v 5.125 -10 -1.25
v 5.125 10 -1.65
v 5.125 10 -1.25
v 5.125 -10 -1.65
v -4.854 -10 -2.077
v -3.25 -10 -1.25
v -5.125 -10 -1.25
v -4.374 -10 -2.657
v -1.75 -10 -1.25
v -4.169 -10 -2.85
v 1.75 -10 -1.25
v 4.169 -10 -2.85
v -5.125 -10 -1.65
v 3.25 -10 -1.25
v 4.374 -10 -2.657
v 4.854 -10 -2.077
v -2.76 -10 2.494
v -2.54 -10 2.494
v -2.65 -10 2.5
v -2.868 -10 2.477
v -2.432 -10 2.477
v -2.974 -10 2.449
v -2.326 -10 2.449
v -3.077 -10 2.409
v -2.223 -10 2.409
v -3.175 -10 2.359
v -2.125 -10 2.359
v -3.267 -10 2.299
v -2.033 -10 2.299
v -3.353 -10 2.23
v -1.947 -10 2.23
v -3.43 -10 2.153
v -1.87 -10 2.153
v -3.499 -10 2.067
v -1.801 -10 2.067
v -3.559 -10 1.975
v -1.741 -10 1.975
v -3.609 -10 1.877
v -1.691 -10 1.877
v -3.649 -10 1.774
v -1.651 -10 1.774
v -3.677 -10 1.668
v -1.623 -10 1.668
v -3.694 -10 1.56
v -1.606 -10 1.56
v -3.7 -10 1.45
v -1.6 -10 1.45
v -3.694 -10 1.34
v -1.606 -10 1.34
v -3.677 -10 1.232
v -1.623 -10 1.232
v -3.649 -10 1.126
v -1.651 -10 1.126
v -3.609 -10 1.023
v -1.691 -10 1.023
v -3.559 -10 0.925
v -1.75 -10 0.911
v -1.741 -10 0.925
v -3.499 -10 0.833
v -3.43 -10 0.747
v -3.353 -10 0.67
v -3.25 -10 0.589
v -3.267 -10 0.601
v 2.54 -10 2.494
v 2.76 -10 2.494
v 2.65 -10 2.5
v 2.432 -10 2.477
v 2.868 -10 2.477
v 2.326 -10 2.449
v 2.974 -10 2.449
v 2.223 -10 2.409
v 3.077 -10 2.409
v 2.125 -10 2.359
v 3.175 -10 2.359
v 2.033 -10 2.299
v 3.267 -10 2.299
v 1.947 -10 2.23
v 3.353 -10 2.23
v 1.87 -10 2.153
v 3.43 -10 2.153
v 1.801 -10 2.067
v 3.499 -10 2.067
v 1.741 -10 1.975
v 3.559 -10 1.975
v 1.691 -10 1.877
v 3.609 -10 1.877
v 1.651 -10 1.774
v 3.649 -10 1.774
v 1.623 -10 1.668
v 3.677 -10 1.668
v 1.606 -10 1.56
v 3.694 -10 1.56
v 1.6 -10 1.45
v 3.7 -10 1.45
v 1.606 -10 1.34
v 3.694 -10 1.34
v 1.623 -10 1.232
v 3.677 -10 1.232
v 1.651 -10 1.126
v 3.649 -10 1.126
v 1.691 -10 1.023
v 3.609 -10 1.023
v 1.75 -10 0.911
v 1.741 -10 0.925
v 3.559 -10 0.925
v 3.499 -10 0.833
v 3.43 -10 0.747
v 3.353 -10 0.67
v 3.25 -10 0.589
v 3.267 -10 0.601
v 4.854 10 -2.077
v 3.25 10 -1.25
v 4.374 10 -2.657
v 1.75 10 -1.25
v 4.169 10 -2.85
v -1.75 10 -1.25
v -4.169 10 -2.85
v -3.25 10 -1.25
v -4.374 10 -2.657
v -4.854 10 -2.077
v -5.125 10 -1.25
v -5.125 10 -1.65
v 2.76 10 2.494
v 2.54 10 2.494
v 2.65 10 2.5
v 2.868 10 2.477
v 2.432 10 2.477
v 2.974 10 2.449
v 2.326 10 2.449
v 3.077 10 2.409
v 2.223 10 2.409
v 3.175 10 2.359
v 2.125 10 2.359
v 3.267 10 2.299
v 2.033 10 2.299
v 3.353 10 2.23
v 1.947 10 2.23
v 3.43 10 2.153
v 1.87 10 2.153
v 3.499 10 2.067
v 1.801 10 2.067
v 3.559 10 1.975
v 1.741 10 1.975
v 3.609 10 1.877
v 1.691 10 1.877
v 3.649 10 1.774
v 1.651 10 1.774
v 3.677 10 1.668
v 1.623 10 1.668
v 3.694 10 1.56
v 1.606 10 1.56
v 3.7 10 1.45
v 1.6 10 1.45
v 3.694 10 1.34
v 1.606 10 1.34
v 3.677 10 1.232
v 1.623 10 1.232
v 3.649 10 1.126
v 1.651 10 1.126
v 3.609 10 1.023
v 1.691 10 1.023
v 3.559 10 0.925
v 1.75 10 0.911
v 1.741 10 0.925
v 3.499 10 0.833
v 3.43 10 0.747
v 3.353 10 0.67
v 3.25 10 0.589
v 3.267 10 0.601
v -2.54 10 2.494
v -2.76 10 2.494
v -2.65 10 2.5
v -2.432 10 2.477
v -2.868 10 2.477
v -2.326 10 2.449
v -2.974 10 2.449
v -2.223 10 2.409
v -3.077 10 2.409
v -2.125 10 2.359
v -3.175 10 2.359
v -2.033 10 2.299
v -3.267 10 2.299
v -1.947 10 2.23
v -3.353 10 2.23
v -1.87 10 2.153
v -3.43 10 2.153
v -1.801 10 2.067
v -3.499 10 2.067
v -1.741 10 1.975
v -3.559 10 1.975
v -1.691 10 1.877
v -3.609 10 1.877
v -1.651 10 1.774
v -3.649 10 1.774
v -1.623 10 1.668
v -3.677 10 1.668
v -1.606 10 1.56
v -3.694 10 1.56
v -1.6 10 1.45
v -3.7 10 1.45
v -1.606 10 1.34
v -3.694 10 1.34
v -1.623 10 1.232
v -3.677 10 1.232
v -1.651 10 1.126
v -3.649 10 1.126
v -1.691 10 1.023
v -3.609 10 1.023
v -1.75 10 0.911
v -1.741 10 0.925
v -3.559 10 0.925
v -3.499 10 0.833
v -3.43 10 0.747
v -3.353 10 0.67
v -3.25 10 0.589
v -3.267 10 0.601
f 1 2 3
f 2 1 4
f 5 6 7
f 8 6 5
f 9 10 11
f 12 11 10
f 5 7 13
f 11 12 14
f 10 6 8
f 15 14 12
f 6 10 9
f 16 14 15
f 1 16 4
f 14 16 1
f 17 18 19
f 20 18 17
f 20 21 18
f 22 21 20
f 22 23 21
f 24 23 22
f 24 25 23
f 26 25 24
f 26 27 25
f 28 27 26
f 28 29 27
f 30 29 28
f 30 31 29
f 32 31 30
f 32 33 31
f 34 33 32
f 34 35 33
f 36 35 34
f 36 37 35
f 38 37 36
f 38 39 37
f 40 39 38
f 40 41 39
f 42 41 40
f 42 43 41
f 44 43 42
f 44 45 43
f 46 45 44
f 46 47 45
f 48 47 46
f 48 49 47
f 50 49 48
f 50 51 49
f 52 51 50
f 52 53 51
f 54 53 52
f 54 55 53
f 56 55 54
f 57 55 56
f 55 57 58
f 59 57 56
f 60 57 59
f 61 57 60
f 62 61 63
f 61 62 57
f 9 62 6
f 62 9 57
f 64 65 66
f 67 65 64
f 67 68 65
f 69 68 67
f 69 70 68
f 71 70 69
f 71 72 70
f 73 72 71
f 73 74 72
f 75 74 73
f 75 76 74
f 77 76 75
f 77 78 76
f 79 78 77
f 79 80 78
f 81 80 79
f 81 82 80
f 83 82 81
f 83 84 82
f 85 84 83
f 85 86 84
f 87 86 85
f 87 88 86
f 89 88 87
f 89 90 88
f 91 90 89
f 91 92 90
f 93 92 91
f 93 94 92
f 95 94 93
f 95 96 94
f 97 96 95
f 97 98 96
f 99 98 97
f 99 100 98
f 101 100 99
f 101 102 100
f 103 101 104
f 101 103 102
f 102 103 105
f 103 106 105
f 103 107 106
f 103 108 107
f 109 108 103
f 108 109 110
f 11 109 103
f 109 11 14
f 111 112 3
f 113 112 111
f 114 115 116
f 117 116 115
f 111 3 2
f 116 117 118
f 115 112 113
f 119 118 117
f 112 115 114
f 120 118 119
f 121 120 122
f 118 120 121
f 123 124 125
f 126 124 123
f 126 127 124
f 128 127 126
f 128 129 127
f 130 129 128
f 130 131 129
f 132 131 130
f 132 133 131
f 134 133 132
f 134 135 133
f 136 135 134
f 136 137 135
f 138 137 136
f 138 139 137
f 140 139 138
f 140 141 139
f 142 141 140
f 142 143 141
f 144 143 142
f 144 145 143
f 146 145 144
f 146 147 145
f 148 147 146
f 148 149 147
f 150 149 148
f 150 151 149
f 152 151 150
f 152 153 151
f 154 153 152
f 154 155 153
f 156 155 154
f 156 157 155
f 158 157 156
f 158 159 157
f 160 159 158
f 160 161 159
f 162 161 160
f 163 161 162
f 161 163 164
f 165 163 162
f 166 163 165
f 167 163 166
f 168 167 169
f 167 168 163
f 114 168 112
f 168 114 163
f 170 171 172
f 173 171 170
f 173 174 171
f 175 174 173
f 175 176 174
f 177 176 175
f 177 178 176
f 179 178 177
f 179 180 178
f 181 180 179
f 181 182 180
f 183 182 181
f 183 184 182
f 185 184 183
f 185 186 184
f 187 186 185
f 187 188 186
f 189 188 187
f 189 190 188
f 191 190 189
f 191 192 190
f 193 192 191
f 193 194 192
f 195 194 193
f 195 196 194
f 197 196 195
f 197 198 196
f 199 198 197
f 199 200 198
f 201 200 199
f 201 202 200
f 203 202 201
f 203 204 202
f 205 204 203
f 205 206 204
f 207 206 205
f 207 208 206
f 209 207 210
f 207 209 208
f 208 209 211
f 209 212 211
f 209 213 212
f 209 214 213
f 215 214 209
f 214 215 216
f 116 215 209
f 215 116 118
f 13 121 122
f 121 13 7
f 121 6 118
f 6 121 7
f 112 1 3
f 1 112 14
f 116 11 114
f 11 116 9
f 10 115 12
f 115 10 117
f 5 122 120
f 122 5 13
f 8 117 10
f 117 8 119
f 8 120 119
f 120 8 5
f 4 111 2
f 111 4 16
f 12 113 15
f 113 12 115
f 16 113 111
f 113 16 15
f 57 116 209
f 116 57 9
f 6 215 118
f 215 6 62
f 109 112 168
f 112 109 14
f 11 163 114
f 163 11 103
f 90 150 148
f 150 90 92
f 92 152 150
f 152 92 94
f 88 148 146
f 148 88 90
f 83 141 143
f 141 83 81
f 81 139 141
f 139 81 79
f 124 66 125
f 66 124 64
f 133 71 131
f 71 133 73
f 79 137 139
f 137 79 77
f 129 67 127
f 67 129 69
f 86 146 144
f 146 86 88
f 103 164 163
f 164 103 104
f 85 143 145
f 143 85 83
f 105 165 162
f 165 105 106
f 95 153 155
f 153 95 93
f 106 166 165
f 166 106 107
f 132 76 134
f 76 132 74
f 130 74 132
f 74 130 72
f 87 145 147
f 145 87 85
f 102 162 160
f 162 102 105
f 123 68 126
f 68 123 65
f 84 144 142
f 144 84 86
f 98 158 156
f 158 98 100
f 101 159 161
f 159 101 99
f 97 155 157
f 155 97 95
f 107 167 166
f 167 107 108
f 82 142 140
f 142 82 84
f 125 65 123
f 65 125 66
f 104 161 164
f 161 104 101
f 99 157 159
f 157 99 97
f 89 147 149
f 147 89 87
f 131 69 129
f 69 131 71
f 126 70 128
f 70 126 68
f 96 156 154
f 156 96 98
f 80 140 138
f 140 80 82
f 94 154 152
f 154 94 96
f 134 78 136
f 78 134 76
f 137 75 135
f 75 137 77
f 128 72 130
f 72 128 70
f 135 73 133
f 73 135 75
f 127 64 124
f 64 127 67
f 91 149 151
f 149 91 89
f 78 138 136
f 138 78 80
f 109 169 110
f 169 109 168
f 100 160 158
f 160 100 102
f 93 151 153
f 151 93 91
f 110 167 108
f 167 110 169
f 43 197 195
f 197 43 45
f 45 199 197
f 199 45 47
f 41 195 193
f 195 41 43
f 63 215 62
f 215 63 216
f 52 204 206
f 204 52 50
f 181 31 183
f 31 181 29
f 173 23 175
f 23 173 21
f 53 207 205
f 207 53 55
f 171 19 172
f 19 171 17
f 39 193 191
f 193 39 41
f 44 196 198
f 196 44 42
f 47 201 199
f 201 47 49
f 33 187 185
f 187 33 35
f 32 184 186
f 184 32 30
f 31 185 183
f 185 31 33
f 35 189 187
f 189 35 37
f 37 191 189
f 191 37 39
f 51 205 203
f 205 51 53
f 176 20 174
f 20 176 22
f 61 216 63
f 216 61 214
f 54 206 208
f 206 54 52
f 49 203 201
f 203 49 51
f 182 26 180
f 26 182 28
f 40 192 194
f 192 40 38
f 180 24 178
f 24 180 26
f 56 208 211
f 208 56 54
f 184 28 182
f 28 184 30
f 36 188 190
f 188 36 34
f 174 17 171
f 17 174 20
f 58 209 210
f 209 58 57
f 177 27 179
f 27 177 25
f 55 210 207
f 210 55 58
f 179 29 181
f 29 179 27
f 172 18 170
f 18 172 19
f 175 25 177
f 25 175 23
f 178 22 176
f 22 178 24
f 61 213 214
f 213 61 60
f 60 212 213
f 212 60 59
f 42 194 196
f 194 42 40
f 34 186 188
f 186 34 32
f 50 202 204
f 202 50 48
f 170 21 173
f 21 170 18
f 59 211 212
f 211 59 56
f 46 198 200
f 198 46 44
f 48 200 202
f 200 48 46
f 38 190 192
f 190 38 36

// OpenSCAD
// [FL_INDEX: keywords="openscad, 3d_parametric, Parametric_8020_cable_clip, csg_solid" | COT="Parametric OpenSCAD design from 3DCodeverse"]
// Title: Parametric 8020 cable clip

cover_length = 20; // the length of the cover

/* [Hidden] */
wing_width = 1.5;

module cover(cover_len)
{

	union() {

		translate([0, -2.2/2 - .95, 0])

			intersection() {
				cube([20.5/2, 1.6, cover_len], center=true);
				translate([0, 3.5, 0])
					cylinder(r=6, h=cover_len, $fn=50, center=true);
	
			}

		translate([-6.5/2 + wing_width/2,0,0])
			cube([wing_width,  2.75, cover_len], center=true);

		translate([6.5/2 - wing_width/2,0,0])
			cube([wing_width, 2.75, cover_len], center=true);

		translate([6.5/2 - wing_width/2 + 0.15, 2.2/2 + 0.35, 0])
			cylinder(r=1.05, h=cover_len, center=true, $fn=60);

		translate([-6.5/2 + wing_width/2 - 0.15, 2.2/2 + 0.35, 0])
			cylinder(r=1.05, h=cover_len, center=true, $fn=60);
	}
}

rotate([90, 0, 0])
	cover(cover_length);
